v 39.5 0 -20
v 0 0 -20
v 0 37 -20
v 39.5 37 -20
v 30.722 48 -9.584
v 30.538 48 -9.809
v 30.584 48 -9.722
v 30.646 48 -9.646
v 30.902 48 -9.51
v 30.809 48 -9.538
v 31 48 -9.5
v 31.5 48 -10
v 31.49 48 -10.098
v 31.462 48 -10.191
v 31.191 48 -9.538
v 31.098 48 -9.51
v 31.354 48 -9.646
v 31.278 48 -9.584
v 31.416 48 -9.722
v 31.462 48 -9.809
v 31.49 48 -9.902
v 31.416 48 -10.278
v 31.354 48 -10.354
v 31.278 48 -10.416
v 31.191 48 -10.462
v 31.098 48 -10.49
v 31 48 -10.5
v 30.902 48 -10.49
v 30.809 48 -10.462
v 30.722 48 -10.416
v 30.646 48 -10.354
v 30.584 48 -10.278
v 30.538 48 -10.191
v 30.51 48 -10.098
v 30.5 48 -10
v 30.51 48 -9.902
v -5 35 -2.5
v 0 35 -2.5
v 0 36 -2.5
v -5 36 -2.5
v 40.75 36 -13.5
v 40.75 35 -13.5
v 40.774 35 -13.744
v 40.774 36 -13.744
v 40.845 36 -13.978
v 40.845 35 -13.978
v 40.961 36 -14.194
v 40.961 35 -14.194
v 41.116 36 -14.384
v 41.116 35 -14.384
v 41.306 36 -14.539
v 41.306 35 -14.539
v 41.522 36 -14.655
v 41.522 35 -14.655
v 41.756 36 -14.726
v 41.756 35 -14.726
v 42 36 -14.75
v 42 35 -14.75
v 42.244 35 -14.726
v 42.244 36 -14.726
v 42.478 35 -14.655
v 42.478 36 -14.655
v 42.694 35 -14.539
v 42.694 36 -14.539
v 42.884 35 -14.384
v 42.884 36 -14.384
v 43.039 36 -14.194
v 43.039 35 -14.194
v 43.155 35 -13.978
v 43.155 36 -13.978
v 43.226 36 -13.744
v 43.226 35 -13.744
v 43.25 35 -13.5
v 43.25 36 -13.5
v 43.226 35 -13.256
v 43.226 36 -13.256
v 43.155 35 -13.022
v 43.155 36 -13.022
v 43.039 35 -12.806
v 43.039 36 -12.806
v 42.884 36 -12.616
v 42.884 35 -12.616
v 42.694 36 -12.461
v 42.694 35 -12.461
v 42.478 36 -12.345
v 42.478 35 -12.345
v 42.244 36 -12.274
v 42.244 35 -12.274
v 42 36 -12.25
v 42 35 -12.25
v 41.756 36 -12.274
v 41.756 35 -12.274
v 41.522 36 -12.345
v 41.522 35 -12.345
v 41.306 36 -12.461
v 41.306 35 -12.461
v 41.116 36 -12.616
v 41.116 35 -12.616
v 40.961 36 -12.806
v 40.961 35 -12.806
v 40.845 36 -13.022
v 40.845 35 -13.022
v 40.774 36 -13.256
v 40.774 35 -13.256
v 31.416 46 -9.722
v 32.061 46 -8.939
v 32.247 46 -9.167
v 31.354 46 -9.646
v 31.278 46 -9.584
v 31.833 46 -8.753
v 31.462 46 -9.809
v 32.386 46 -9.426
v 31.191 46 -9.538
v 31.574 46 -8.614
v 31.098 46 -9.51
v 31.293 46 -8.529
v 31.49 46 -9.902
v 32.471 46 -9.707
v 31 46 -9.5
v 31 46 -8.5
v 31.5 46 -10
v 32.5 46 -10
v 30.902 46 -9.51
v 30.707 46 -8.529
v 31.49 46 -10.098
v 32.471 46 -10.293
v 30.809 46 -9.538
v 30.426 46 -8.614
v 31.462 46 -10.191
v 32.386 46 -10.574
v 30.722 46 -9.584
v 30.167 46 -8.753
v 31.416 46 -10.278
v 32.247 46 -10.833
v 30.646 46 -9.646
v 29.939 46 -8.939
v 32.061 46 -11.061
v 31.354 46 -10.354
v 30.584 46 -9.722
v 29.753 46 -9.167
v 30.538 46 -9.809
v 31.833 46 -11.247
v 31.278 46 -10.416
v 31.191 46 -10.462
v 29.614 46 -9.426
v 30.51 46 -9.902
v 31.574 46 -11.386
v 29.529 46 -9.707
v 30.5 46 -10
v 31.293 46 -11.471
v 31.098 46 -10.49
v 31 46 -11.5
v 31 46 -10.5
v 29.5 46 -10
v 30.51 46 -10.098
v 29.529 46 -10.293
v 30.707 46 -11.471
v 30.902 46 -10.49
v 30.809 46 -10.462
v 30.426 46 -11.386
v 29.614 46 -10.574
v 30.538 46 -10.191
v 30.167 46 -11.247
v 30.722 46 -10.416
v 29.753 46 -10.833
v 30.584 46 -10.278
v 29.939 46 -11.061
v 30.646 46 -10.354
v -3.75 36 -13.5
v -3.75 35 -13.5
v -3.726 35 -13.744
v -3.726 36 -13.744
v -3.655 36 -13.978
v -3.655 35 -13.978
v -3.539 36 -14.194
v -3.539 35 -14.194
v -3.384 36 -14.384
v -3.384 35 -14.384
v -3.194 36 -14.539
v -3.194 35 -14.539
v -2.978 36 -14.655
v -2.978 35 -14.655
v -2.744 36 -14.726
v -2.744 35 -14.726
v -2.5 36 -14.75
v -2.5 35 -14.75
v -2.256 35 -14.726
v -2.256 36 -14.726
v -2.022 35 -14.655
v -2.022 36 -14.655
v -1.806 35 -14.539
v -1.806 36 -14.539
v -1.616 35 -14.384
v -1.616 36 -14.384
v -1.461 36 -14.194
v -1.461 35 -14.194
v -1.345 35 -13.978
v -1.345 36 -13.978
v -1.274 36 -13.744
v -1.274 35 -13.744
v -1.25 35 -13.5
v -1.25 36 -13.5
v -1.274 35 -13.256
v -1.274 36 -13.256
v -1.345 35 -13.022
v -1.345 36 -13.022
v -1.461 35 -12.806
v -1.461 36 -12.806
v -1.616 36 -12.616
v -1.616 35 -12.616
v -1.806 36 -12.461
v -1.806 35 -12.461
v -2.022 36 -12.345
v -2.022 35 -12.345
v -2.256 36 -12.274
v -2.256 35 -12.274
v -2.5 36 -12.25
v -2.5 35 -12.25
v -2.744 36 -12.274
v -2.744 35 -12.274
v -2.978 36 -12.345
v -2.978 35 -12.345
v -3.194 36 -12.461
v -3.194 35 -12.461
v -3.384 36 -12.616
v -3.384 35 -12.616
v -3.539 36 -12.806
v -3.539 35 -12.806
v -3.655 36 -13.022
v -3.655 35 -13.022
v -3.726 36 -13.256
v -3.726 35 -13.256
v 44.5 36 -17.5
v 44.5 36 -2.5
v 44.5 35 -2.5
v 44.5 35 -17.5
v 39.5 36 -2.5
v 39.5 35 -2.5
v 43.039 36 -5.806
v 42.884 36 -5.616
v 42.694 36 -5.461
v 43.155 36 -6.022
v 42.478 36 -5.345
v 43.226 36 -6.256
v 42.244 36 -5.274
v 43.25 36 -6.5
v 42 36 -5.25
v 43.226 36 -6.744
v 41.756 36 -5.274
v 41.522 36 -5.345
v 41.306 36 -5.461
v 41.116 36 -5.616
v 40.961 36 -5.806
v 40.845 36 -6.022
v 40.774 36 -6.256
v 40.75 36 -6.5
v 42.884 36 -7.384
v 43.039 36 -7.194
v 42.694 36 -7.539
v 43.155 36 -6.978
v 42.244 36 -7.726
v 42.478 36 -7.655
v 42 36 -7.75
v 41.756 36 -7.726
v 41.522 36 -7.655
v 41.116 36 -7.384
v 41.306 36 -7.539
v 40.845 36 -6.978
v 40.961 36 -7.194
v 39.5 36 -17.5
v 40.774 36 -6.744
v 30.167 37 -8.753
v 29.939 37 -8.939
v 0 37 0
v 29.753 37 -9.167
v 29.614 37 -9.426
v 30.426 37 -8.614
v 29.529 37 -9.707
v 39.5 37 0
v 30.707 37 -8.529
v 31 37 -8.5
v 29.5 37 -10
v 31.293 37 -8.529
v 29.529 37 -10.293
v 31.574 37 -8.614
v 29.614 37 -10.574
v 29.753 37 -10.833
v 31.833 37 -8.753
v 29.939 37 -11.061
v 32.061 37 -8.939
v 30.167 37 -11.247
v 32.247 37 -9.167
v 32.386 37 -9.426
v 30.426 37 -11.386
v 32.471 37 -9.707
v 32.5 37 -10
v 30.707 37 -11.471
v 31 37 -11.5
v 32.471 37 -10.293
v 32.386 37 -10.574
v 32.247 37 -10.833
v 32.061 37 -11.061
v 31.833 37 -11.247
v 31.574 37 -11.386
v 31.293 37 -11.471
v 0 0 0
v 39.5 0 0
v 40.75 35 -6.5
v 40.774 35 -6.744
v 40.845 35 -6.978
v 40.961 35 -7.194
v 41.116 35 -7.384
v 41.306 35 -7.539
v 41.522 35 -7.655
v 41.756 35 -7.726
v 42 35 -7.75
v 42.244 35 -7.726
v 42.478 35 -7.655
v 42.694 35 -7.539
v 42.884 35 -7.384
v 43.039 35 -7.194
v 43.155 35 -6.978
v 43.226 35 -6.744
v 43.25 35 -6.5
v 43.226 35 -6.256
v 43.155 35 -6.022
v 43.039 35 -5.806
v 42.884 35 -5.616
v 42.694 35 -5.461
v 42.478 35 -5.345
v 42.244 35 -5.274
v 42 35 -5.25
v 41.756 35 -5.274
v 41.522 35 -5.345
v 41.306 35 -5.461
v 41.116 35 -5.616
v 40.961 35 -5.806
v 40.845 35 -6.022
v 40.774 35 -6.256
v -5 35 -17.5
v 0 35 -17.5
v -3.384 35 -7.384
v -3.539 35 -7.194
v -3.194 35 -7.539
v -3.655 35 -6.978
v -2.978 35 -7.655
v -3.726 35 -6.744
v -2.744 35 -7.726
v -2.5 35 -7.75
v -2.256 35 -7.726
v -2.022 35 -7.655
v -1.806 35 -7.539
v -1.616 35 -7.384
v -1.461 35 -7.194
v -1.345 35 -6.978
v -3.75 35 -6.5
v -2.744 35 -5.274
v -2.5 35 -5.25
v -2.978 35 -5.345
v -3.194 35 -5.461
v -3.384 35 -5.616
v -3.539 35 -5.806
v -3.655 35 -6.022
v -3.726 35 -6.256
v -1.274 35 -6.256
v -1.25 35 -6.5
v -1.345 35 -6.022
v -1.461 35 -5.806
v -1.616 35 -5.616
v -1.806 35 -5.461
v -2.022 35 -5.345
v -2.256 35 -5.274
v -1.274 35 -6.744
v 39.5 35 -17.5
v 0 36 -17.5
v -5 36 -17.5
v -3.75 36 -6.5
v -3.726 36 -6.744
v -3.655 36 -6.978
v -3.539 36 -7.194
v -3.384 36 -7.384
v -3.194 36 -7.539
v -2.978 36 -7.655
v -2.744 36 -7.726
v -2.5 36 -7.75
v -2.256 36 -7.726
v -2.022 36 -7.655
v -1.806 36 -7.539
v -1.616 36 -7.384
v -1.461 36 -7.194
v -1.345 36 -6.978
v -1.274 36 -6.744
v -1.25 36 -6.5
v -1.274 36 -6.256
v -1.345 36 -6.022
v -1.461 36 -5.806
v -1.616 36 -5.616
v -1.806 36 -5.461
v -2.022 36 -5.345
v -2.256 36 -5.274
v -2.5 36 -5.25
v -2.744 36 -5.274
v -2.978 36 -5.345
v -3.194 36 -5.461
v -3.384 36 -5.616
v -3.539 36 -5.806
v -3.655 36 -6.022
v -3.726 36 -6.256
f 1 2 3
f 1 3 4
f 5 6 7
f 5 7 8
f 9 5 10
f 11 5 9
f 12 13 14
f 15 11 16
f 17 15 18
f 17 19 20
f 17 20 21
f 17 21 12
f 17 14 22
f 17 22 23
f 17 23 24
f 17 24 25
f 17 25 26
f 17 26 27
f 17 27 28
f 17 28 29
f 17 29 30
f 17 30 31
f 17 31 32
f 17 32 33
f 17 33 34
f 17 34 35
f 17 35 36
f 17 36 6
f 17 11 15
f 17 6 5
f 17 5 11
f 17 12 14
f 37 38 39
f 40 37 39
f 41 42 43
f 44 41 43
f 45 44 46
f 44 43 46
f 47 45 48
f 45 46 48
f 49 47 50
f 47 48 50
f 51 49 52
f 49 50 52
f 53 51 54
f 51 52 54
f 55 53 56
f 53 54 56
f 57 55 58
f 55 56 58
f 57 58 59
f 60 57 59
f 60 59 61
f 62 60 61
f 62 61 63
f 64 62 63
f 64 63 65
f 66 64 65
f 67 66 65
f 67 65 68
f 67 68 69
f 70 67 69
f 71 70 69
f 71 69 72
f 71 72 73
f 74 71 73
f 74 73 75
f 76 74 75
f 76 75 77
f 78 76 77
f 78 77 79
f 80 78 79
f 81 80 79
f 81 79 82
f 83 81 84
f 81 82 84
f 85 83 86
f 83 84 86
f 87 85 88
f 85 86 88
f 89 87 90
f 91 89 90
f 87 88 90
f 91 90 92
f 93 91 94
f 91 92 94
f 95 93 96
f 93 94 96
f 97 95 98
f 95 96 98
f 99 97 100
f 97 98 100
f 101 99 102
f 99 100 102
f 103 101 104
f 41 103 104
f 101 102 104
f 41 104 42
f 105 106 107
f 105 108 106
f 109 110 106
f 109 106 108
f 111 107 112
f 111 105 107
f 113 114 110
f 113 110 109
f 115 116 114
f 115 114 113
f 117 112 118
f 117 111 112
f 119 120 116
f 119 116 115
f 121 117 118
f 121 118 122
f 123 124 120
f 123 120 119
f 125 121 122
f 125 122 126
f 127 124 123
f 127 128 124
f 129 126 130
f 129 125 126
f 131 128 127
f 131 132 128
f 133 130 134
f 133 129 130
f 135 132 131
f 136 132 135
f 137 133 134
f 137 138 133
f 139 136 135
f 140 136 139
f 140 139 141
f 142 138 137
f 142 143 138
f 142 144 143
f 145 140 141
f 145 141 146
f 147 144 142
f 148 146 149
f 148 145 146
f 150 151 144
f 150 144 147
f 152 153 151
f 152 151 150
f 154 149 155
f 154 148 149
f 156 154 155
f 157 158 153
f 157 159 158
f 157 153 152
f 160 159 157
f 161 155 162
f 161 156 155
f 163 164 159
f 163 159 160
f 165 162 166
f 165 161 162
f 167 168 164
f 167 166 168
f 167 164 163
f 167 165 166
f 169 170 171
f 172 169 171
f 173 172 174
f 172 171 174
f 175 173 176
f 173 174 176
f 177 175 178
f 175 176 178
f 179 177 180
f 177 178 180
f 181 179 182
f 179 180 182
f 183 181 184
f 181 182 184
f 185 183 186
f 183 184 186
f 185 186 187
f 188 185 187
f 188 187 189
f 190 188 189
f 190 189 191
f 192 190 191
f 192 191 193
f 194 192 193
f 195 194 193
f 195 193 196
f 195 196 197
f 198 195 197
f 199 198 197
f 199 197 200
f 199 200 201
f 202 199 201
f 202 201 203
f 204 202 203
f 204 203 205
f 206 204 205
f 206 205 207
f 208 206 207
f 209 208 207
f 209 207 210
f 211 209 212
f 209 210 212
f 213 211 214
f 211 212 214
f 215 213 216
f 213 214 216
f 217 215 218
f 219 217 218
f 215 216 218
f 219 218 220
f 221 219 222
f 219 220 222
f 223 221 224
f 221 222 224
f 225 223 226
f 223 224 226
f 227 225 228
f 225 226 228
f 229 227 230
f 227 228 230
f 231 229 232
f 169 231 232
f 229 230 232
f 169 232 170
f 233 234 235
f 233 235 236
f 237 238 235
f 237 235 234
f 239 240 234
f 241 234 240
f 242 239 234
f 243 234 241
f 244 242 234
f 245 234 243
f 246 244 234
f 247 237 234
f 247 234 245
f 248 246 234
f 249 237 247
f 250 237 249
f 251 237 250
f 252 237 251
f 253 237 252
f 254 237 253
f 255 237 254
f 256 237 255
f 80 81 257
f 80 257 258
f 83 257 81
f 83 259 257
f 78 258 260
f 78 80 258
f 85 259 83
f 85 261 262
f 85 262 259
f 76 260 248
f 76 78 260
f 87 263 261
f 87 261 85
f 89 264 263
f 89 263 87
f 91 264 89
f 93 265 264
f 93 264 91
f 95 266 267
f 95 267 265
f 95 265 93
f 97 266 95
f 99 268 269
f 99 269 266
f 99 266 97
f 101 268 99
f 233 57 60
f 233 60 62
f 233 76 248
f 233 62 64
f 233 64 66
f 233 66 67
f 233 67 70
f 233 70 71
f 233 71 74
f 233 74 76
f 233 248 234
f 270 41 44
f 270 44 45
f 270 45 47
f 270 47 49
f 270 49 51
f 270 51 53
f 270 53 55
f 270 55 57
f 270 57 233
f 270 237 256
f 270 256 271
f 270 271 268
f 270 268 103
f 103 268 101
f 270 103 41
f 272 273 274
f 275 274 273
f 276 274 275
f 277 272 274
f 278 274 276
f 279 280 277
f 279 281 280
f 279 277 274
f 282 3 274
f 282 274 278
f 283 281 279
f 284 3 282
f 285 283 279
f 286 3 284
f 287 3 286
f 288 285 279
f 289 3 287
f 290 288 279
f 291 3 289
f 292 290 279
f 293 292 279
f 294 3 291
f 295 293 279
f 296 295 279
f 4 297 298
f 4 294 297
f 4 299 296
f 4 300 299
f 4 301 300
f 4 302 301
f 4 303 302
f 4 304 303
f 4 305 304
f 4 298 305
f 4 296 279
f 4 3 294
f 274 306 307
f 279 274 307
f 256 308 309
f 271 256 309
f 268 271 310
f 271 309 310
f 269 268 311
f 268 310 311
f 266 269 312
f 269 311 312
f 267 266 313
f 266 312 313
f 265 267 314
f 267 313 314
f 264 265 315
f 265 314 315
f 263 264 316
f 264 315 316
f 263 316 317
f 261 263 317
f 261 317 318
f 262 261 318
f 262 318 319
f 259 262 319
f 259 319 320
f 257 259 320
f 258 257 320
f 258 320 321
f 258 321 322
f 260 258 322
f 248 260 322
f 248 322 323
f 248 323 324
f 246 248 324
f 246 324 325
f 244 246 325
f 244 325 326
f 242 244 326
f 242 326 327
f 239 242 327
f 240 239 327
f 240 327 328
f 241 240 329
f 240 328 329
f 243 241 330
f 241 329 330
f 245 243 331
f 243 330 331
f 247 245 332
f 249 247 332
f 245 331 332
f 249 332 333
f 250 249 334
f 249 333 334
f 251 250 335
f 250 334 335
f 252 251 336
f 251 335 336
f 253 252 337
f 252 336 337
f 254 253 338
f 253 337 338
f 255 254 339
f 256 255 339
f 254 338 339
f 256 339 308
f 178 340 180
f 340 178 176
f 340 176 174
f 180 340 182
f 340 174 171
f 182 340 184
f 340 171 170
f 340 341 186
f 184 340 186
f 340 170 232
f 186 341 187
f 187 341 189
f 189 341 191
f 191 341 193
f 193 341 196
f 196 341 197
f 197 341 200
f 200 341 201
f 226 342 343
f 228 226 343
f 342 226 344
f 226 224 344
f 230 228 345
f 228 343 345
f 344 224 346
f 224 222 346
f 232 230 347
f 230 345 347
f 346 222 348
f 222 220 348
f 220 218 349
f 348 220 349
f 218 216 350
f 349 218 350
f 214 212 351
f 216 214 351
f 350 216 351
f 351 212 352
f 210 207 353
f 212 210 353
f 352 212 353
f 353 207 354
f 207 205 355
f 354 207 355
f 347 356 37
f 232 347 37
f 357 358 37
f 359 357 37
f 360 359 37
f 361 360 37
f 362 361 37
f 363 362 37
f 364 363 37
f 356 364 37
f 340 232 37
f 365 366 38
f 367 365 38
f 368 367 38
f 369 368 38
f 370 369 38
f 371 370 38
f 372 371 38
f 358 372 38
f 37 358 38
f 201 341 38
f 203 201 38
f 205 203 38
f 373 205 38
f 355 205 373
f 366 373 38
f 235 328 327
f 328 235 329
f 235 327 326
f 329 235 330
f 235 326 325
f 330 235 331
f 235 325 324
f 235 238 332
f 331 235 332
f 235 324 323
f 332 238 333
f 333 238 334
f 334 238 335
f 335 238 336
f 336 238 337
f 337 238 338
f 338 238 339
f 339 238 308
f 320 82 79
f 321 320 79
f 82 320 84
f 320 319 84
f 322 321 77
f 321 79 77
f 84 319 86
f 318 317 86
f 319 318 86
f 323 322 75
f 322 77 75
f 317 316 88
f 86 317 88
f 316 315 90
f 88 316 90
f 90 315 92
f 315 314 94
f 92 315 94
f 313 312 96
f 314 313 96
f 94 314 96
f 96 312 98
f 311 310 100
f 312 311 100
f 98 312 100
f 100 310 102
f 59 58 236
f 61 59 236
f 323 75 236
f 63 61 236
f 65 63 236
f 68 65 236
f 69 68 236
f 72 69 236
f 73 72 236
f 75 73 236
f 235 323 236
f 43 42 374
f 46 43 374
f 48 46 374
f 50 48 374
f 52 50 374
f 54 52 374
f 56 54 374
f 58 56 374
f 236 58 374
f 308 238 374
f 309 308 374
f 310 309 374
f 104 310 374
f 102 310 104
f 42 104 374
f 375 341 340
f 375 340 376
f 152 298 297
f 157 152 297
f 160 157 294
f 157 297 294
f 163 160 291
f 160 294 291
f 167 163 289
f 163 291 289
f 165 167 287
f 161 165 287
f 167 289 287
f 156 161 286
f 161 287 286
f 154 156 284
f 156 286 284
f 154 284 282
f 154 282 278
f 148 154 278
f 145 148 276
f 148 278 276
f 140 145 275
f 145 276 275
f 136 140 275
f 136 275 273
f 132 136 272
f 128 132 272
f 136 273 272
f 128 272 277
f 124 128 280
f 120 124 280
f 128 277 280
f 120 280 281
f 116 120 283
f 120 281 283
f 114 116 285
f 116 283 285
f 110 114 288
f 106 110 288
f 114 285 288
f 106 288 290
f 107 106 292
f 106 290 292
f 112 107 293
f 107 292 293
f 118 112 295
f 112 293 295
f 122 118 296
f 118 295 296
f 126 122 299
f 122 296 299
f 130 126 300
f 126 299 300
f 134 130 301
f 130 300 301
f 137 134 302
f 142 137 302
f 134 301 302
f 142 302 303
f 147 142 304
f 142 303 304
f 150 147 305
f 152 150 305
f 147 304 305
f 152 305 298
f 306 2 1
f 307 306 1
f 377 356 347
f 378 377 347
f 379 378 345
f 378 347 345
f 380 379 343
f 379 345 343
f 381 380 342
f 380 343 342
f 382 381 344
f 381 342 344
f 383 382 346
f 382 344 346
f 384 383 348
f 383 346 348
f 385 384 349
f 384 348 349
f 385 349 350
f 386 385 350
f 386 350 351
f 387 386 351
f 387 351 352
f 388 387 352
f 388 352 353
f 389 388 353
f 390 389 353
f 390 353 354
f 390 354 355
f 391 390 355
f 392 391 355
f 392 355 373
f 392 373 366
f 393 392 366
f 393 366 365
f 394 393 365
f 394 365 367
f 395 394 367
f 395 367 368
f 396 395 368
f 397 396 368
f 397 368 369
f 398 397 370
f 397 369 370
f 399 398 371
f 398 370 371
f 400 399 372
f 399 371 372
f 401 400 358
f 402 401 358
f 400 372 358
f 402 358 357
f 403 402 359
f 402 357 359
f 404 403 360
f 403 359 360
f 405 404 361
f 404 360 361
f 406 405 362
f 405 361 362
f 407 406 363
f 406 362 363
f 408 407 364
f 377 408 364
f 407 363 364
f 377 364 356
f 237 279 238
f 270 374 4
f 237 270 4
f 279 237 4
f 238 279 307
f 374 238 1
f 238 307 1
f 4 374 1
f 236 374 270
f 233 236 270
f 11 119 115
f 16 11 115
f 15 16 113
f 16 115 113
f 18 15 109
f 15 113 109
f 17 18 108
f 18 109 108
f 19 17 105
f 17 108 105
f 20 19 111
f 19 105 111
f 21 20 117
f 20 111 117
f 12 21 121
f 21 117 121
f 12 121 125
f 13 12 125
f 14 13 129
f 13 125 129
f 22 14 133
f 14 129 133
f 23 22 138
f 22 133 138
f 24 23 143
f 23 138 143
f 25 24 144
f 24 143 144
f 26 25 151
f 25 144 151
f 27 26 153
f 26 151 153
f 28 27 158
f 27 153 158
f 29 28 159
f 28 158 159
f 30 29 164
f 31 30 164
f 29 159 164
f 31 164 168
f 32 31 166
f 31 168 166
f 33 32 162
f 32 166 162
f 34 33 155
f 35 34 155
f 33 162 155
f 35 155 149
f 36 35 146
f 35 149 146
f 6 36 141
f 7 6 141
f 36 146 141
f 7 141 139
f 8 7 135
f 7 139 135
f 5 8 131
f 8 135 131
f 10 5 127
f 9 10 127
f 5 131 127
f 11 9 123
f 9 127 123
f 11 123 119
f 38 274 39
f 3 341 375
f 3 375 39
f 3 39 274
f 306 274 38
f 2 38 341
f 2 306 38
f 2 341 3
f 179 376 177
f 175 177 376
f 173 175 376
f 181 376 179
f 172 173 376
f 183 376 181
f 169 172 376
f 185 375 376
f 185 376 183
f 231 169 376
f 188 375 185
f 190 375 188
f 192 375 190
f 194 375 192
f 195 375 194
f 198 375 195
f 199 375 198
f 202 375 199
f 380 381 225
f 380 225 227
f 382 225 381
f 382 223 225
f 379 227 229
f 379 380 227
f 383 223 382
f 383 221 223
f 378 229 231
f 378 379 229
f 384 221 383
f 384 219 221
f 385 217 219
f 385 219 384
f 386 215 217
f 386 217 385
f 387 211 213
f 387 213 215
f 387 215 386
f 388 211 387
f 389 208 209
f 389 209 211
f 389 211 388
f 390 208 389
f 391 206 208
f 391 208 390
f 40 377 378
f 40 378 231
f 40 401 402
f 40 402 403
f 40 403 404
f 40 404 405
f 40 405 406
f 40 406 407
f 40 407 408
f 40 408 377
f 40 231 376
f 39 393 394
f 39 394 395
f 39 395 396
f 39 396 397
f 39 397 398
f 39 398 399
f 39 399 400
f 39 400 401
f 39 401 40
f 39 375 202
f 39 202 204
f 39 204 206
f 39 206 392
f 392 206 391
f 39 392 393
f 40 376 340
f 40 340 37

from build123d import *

# Parameters (mm, degrees)
SKETCH_1_W      = 39.5
SKETCH_1_H      = 20
EXTRUDE_1_DEPTH = 37
SKETCH_2_R      = 1.5
EXTRUDE_2_DEPTH = 9
SKETCH_14_W     = 15
SKETCH_14_H     = 1
EXTRUDE_5_DEPTH = 5
SKETCH_15_W     = 15
SKETCH_15_H     = 1
EXTRUDE_6_DEPTH = 5
M3X0_5_1_D      = 2.5
M3X0_5_1_DEPTH  = 8.5
M3X0_5_1_TIP    = 0.751075774
SKETCH_3_R      = 0.5
EXTRUDE_7_DEPTH = 2


with BuildPart() as part:
    # ｽｹｯﾁ1 → ﾎﾞｽ - 押し出し1 (new body)
    with BuildSketch(Plane(origin=(0, 0, 0), x_dir=(1, 0, 0), z_dir=(0, 1, 0))):
        with Locations((19.75, 10)):
            Rectangle(SKETCH_1_W, SKETCH_1_H)
    extrude(amount=EXTRUDE_1_DEPTH)

    # ｽｹｯﾁ2 → ﾎﾞｽ - 押し出し2 (add)
    with BuildSketch(Plane(origin=(0, 37, 0), x_dir=(1, 0, 0), z_dir=(0, 1, 0))):
        with Locations(Location((31, 10, 0), (0, 0, 90))):
            Circle(SKETCH_2_R)
    extrude(amount=EXTRUDE_2_DEPTH)

    # ｽｹｯﾁ14 → ﾎﾞｽ - 押し出し5 (add)
    with BuildSketch(Plane(origin=(39.5, 0, 0), x_dir=(0, 0, -1), z_dir=(1, 0, 0))):
        with Locations((10, 35.5)):
            Rectangle(SKETCH_14_W, SKETCH_14_H)
    extrude(amount=EXTRUDE_5_DEPTH)

    # ｽｹｯﾁ15 → ﾎﾞｽ - 押し出し6 (add)
    with BuildSketch(Plane.ZY):
        with Locations((-10, 35.5)):
            Rectangle(SKETCH_15_W, SKETCH_15_H)
    extrude(amount=EXTRUDE_6_DEPTH)

    # M3x0.5 ねじ穴1
    with Locations(Plane(origin=(0, 36, 0), x_dir=(1, 0, 0), z_dir=(0, 1, 0))):
        with Locations((-2.5, 13.5), (-2.5, 6.5), (42, 6.5), (42, 13.5)):
            Hole(M3X0_5_1_D / 2, depth=M3X0_5_1_DEPTH)
            with Locations((0, 0, -(M3X0_5_1_DEPTH + M3X0_5_1_TIP / 2))):  # 118° drill point
                Cone(0, M3X0_5_1_D / 2, M3X0_5_1_TIP, mode=Mode.SUBTRACT)

    # ｽｹｯﾁ3 → ﾎﾞｽ - 押し出し7 (add)
    with BuildSketch(Plane(origin=(0, 46, 0), x_dir=(1, 0, 0), z_dir=(0, 1, 0))):
        with Locations(Location((31, 10, 0), (0, 0, 270))):
            Circle(SKETCH_3_R)
    extrude(amount=EXTRUDE_7_DEPTH)


solid = part.part
